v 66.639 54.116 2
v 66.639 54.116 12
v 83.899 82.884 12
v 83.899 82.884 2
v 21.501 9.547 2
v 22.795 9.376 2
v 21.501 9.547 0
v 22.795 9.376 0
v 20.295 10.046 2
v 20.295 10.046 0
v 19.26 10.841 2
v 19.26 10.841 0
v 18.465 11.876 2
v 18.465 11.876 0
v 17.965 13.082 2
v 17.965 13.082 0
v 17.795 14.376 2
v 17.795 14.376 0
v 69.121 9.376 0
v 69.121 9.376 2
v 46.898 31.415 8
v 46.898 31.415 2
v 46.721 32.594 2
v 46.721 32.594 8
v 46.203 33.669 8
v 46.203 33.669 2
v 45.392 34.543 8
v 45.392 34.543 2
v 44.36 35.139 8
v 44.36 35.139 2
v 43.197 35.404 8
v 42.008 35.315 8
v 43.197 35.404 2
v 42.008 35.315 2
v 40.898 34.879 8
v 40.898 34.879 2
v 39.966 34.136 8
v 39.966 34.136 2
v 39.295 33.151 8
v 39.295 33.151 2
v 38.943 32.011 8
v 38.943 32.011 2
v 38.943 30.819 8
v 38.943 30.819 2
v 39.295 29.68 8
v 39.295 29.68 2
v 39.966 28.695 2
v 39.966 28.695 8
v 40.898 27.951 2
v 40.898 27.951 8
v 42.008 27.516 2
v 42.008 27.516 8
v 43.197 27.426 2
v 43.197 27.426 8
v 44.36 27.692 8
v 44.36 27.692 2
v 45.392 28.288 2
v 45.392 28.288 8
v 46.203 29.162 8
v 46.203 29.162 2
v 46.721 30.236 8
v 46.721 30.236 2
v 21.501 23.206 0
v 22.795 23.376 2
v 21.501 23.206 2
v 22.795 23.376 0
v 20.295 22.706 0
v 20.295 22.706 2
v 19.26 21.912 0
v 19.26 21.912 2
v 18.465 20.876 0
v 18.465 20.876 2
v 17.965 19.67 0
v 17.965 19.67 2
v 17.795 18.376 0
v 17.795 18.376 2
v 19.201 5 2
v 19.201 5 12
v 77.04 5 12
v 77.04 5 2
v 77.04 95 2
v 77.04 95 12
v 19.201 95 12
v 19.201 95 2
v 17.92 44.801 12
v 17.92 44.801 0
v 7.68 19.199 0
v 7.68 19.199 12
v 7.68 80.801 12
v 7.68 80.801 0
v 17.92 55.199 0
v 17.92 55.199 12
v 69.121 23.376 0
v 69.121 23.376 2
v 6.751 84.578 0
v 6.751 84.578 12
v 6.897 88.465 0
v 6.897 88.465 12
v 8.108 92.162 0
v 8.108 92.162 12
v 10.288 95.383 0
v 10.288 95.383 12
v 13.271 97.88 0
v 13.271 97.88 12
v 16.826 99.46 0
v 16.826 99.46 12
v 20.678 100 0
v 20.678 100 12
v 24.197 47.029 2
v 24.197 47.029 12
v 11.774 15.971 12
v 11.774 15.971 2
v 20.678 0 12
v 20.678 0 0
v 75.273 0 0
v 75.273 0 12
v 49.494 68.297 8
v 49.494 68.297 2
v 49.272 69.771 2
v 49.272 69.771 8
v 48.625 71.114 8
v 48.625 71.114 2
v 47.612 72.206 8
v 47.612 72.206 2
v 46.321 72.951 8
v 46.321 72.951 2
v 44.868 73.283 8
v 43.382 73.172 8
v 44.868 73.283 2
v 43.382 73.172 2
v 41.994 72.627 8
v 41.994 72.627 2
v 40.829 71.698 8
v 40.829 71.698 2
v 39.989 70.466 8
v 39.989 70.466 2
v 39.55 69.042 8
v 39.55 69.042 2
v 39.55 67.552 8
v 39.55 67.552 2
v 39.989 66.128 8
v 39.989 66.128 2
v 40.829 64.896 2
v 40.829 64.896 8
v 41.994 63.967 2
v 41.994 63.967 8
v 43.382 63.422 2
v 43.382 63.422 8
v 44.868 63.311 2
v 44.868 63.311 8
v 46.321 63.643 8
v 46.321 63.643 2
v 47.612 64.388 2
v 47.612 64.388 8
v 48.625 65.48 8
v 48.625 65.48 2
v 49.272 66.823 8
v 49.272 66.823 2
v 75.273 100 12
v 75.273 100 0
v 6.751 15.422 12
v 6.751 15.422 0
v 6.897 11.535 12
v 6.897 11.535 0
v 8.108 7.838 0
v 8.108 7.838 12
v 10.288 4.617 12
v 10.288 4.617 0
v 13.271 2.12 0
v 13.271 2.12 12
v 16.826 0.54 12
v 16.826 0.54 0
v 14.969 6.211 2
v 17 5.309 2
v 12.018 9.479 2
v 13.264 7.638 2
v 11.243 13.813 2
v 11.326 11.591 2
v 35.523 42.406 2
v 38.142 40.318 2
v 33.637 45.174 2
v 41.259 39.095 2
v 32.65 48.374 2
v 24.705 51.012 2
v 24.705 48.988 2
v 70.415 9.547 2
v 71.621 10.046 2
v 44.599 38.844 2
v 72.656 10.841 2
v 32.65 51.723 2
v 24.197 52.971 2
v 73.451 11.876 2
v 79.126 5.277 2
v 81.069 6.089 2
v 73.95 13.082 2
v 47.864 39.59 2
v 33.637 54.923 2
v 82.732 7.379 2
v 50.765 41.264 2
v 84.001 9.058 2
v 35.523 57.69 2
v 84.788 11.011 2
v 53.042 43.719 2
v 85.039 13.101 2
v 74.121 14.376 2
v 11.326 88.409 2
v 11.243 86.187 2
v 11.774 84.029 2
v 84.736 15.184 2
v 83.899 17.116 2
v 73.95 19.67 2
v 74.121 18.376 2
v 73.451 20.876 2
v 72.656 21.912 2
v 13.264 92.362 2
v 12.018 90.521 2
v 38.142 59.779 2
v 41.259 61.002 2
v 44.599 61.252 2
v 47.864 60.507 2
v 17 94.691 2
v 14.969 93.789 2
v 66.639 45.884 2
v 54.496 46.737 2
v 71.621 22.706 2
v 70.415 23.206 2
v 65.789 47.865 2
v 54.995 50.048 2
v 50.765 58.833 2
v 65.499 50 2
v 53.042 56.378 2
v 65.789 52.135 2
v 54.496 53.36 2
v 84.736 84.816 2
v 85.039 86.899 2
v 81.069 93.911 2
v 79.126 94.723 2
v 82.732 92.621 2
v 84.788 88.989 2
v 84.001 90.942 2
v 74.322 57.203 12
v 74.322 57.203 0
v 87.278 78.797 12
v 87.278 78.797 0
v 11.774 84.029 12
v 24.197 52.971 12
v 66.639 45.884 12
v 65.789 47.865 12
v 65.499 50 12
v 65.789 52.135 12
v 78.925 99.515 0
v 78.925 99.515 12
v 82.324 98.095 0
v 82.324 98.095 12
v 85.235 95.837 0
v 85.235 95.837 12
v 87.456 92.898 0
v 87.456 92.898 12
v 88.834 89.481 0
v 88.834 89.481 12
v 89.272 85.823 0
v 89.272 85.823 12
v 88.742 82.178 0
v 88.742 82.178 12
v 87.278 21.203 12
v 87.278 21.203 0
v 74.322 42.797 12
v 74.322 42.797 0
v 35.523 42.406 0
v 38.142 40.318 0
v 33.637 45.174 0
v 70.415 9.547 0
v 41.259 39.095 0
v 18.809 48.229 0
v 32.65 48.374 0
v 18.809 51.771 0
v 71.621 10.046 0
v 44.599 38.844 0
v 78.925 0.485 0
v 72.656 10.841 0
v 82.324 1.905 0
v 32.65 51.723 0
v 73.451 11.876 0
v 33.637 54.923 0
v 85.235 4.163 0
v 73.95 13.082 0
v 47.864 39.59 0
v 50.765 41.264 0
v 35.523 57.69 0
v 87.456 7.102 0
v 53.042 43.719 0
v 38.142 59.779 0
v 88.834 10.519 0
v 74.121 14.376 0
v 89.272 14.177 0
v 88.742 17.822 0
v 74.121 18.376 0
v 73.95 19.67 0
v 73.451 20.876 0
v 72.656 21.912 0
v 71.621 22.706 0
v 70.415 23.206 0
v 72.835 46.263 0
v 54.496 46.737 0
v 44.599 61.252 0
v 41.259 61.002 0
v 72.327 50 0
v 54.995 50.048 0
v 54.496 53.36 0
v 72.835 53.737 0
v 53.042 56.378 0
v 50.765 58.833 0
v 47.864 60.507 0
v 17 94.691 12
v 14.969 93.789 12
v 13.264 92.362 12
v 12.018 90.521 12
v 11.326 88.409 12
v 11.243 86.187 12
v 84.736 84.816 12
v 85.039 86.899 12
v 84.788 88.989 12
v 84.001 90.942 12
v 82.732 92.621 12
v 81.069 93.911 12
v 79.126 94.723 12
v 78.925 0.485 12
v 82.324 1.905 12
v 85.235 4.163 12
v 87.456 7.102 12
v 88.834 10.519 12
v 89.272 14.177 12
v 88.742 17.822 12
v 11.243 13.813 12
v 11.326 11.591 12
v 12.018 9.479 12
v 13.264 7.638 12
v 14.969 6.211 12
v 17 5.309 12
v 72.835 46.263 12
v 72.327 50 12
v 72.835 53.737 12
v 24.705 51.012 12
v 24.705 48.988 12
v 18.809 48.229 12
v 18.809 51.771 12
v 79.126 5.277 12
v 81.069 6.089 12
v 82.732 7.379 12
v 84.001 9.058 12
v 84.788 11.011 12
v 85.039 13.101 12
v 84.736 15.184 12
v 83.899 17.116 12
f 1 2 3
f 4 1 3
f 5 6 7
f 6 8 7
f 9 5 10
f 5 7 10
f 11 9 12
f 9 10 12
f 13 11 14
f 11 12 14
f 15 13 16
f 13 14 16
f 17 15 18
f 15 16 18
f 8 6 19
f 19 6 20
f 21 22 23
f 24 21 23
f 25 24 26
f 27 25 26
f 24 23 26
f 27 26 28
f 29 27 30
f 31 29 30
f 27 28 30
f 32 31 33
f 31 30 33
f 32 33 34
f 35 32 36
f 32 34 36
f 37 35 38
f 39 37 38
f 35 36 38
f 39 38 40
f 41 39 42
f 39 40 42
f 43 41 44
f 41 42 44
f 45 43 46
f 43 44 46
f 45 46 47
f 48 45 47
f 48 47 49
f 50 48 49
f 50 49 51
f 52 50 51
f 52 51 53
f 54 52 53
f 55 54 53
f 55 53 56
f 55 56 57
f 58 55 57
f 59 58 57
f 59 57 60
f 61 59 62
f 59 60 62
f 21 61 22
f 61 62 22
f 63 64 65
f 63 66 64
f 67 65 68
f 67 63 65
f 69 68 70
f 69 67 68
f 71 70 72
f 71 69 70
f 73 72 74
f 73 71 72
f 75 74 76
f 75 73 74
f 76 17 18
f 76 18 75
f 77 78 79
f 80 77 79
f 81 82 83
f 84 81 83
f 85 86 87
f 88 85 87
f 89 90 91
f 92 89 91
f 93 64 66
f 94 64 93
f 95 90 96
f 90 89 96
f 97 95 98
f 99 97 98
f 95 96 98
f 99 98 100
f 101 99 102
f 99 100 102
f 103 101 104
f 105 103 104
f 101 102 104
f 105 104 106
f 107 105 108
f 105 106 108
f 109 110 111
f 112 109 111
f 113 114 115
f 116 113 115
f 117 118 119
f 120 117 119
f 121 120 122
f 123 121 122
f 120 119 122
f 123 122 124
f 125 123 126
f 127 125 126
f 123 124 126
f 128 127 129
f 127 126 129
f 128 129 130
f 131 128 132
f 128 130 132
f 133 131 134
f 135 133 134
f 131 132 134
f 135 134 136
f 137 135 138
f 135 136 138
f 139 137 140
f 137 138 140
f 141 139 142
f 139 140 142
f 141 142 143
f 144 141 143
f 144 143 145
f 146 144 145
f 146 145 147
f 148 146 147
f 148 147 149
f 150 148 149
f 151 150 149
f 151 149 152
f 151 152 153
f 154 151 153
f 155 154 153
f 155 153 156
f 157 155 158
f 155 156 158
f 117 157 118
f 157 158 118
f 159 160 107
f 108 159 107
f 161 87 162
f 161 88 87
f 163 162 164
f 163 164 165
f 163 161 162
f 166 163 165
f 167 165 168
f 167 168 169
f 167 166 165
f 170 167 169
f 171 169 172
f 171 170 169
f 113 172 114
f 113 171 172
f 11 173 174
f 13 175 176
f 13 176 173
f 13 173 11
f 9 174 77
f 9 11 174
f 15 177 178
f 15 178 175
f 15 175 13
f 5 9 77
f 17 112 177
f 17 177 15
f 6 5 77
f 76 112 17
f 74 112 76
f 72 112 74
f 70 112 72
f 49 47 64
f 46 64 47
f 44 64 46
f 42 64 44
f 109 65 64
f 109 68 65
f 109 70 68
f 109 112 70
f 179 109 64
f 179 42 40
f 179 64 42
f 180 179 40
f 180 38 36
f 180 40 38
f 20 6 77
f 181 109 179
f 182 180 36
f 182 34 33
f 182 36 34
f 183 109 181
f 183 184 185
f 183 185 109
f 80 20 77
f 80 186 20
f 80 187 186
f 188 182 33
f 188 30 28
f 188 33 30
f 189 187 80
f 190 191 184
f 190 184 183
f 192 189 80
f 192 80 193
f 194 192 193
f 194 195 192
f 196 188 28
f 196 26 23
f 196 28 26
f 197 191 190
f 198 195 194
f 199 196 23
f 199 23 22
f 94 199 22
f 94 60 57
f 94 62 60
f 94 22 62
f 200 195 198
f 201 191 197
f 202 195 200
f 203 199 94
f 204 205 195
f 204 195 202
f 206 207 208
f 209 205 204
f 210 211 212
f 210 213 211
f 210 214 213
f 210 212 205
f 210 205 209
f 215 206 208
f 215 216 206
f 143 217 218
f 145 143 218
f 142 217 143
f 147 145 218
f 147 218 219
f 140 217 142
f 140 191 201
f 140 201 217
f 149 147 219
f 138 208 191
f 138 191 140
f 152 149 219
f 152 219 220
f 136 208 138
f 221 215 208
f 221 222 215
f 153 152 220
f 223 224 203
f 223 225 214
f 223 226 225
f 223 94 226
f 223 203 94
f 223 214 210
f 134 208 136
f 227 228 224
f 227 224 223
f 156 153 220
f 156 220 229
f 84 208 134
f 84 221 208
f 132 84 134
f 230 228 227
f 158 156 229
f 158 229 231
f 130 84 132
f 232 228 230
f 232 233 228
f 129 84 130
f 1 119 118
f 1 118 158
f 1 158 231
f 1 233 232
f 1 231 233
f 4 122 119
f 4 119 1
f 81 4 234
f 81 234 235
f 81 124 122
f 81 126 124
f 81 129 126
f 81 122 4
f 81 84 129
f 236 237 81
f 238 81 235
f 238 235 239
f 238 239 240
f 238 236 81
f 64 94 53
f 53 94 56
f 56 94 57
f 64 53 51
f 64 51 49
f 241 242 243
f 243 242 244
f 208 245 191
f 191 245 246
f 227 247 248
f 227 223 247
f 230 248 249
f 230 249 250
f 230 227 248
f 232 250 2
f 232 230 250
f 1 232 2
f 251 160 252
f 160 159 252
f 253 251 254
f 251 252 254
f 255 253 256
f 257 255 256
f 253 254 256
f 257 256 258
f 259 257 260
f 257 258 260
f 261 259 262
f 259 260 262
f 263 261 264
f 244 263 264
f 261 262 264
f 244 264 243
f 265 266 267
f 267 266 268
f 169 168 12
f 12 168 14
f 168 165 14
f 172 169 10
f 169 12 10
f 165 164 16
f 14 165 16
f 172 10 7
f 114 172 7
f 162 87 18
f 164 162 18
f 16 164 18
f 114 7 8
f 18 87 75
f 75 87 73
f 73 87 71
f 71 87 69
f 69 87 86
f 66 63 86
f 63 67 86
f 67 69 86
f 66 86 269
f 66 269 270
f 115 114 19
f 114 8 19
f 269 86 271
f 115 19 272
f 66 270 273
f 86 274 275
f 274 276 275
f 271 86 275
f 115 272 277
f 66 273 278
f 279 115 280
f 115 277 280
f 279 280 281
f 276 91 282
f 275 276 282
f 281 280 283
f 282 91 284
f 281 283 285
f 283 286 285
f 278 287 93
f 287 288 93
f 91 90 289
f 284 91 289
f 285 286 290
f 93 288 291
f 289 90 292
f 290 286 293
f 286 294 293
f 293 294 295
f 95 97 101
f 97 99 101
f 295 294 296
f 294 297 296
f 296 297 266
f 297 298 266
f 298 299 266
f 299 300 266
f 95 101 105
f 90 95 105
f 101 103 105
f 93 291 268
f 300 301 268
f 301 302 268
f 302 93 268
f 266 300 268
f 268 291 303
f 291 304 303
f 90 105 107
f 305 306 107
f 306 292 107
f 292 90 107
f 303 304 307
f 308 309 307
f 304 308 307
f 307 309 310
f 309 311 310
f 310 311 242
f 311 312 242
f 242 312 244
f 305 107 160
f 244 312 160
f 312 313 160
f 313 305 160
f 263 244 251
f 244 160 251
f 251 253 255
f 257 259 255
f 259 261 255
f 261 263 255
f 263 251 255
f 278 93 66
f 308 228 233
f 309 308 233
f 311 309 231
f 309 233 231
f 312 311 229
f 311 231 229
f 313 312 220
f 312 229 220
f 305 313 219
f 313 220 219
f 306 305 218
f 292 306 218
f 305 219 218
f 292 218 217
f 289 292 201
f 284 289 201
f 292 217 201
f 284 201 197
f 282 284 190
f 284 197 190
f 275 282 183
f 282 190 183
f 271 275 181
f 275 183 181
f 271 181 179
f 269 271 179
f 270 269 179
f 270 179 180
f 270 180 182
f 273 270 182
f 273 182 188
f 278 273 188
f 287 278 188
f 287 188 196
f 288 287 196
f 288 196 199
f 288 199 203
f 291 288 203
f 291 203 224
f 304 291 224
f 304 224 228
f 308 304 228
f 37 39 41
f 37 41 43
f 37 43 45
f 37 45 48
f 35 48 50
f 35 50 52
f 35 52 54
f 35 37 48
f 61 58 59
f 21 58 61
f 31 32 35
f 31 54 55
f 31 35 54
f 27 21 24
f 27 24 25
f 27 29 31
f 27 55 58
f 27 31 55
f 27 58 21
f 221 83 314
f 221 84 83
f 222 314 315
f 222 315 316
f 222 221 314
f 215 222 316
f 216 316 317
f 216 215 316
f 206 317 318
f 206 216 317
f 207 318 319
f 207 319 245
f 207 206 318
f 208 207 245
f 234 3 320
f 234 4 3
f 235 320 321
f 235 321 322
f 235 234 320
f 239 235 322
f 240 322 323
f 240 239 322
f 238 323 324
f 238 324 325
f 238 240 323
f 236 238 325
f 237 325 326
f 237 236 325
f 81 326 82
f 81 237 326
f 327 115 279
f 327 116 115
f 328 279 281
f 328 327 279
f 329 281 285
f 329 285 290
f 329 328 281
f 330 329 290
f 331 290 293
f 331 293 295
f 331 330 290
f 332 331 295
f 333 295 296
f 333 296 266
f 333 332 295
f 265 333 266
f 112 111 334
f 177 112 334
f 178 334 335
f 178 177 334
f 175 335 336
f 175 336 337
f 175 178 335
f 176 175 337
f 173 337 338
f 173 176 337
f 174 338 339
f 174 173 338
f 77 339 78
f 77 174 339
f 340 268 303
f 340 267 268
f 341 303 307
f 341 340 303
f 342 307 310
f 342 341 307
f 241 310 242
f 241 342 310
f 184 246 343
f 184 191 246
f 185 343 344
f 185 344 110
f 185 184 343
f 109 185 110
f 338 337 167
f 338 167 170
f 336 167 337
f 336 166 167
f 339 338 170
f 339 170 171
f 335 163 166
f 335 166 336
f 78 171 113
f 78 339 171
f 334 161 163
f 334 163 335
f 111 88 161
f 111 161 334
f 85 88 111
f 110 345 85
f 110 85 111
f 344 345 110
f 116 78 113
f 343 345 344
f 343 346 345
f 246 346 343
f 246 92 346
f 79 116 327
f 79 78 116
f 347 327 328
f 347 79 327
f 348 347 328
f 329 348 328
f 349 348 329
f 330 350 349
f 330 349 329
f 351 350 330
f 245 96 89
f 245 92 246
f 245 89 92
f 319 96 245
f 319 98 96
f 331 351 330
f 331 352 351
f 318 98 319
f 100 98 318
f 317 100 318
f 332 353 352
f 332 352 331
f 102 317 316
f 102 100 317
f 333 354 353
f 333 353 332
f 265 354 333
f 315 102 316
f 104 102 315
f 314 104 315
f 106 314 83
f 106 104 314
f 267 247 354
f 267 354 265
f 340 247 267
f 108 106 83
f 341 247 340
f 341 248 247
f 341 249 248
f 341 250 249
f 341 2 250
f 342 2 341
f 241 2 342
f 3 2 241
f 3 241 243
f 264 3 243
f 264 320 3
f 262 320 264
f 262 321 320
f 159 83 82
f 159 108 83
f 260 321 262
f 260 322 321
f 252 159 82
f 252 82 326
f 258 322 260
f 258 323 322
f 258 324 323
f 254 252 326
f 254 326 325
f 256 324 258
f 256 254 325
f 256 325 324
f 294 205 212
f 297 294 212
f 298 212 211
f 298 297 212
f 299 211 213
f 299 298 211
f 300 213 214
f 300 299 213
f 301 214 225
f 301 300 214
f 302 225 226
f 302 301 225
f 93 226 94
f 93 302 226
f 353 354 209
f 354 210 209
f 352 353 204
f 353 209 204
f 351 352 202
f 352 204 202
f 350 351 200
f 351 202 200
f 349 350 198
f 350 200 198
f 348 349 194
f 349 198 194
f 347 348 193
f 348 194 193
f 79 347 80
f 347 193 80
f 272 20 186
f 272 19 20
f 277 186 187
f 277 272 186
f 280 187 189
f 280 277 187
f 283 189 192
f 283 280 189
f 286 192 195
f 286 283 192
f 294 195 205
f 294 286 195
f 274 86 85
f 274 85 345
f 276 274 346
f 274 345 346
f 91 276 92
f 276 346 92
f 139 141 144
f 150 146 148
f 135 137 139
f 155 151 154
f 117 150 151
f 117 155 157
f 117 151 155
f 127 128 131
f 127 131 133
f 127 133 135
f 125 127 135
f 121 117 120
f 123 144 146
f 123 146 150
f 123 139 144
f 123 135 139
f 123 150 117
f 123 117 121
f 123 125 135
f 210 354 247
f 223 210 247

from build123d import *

# Parameters (mm, degrees)
F1_DEPTH  = 12
F3_DEPTH  = 10
F4_R      = 4
F4_R_2    = 5
F5_DEPTH  = 6
F6_R      = 8
F7_R      = 14
F8_R      = 11.235347
F9_DEPTH  = 25
F10_W     = 56.325583
F10_H     = 14
F12_DEPTH = 25
F13_R     = 5


with BuildPart() as f1:
    # F0 (on Top) → F1 (new body)
    with BuildSketch(Plane.XY):
        Polygon((20, 50), (0, 0), (100, 0), (70, 50), (100, 100), (0, 100), align=None)
    extrude(amount=F1_DEPTH)

    # F2 (on face) → F3 (cut)
    with BuildSketch(Plane.XY.offset(12)):
        Polygon((91.169048, 5), (64.169048, 50), (91.169048, 95), (7.385165, 95), (25.385165, 50), (7.385165, 5), align=None)
    extrude(amount=-F3_DEPTH, mode=Mode.SUBTRACT)

    # F4 (on face) → F5 (join)
    with BuildSketch(Plane.XY.offset(2)):
        with Locations((42.898408, 31.41522)):
            Circle(F4_R)
        with Locations((44.494253, 68.297007)):
            Circle(F4_R_2)
    extrude(amount=F5_DEPTH)

    # F6
    f6_edges = [f1.edges().sort_by_distance(p)[0] for p in [
        (7.385165, 95, 7),
        (25.385165, 50, 7),
        (7.385165, 5, 7),
        (91.169048, 95, 7),
        (64.169048, 50, 7),
        (91.169048, 5, 7),
    ]]
    fillet(f6_edges, radius=F6_R)

    # F7
    f7_edges = [f1.edges().sort_by_distance(p)[0] for p in [
        (20, 50, 6),
        (0, 100, 6),
        (100, 100, 6),
        (70, 50, 6),
        (100, 0, 6),
        (0, 0, 6),
    ]]
    fillet(f7_edges, radius=F7_R)

    # F8 (on face) → F9 (cut)
    with BuildSketch(Plane.XY.offset(2)):
        with Locations((43.759387, 50.048411)):
            Circle(F8_R)
    extrude(amount=-F9_DEPTH, mode=Mode.SUBTRACT)

    # F10 (on face) → F12 (cut)
    with BuildSketch(Plane.XY.offset(2)):
        with Locations((45.957904, 16.376337)):
            Rectangle(F10_W, F10_H)
    extrude(amount=-F12_DEPTH, mode=Mode.SUBTRACT)

    # F13
    f13_edges = [f1.edges().sort_by_distance(p)[0] for p in [
        (17.795112, 23.376337, 1),
        (74.120695, 23.376337, 1),
        (74.120695, 9.376337, 1),
        (17.795112, 9.376337, 1),
    ]]
    fillet(f13_edges, radius=F13_R)


solid = f1.part
